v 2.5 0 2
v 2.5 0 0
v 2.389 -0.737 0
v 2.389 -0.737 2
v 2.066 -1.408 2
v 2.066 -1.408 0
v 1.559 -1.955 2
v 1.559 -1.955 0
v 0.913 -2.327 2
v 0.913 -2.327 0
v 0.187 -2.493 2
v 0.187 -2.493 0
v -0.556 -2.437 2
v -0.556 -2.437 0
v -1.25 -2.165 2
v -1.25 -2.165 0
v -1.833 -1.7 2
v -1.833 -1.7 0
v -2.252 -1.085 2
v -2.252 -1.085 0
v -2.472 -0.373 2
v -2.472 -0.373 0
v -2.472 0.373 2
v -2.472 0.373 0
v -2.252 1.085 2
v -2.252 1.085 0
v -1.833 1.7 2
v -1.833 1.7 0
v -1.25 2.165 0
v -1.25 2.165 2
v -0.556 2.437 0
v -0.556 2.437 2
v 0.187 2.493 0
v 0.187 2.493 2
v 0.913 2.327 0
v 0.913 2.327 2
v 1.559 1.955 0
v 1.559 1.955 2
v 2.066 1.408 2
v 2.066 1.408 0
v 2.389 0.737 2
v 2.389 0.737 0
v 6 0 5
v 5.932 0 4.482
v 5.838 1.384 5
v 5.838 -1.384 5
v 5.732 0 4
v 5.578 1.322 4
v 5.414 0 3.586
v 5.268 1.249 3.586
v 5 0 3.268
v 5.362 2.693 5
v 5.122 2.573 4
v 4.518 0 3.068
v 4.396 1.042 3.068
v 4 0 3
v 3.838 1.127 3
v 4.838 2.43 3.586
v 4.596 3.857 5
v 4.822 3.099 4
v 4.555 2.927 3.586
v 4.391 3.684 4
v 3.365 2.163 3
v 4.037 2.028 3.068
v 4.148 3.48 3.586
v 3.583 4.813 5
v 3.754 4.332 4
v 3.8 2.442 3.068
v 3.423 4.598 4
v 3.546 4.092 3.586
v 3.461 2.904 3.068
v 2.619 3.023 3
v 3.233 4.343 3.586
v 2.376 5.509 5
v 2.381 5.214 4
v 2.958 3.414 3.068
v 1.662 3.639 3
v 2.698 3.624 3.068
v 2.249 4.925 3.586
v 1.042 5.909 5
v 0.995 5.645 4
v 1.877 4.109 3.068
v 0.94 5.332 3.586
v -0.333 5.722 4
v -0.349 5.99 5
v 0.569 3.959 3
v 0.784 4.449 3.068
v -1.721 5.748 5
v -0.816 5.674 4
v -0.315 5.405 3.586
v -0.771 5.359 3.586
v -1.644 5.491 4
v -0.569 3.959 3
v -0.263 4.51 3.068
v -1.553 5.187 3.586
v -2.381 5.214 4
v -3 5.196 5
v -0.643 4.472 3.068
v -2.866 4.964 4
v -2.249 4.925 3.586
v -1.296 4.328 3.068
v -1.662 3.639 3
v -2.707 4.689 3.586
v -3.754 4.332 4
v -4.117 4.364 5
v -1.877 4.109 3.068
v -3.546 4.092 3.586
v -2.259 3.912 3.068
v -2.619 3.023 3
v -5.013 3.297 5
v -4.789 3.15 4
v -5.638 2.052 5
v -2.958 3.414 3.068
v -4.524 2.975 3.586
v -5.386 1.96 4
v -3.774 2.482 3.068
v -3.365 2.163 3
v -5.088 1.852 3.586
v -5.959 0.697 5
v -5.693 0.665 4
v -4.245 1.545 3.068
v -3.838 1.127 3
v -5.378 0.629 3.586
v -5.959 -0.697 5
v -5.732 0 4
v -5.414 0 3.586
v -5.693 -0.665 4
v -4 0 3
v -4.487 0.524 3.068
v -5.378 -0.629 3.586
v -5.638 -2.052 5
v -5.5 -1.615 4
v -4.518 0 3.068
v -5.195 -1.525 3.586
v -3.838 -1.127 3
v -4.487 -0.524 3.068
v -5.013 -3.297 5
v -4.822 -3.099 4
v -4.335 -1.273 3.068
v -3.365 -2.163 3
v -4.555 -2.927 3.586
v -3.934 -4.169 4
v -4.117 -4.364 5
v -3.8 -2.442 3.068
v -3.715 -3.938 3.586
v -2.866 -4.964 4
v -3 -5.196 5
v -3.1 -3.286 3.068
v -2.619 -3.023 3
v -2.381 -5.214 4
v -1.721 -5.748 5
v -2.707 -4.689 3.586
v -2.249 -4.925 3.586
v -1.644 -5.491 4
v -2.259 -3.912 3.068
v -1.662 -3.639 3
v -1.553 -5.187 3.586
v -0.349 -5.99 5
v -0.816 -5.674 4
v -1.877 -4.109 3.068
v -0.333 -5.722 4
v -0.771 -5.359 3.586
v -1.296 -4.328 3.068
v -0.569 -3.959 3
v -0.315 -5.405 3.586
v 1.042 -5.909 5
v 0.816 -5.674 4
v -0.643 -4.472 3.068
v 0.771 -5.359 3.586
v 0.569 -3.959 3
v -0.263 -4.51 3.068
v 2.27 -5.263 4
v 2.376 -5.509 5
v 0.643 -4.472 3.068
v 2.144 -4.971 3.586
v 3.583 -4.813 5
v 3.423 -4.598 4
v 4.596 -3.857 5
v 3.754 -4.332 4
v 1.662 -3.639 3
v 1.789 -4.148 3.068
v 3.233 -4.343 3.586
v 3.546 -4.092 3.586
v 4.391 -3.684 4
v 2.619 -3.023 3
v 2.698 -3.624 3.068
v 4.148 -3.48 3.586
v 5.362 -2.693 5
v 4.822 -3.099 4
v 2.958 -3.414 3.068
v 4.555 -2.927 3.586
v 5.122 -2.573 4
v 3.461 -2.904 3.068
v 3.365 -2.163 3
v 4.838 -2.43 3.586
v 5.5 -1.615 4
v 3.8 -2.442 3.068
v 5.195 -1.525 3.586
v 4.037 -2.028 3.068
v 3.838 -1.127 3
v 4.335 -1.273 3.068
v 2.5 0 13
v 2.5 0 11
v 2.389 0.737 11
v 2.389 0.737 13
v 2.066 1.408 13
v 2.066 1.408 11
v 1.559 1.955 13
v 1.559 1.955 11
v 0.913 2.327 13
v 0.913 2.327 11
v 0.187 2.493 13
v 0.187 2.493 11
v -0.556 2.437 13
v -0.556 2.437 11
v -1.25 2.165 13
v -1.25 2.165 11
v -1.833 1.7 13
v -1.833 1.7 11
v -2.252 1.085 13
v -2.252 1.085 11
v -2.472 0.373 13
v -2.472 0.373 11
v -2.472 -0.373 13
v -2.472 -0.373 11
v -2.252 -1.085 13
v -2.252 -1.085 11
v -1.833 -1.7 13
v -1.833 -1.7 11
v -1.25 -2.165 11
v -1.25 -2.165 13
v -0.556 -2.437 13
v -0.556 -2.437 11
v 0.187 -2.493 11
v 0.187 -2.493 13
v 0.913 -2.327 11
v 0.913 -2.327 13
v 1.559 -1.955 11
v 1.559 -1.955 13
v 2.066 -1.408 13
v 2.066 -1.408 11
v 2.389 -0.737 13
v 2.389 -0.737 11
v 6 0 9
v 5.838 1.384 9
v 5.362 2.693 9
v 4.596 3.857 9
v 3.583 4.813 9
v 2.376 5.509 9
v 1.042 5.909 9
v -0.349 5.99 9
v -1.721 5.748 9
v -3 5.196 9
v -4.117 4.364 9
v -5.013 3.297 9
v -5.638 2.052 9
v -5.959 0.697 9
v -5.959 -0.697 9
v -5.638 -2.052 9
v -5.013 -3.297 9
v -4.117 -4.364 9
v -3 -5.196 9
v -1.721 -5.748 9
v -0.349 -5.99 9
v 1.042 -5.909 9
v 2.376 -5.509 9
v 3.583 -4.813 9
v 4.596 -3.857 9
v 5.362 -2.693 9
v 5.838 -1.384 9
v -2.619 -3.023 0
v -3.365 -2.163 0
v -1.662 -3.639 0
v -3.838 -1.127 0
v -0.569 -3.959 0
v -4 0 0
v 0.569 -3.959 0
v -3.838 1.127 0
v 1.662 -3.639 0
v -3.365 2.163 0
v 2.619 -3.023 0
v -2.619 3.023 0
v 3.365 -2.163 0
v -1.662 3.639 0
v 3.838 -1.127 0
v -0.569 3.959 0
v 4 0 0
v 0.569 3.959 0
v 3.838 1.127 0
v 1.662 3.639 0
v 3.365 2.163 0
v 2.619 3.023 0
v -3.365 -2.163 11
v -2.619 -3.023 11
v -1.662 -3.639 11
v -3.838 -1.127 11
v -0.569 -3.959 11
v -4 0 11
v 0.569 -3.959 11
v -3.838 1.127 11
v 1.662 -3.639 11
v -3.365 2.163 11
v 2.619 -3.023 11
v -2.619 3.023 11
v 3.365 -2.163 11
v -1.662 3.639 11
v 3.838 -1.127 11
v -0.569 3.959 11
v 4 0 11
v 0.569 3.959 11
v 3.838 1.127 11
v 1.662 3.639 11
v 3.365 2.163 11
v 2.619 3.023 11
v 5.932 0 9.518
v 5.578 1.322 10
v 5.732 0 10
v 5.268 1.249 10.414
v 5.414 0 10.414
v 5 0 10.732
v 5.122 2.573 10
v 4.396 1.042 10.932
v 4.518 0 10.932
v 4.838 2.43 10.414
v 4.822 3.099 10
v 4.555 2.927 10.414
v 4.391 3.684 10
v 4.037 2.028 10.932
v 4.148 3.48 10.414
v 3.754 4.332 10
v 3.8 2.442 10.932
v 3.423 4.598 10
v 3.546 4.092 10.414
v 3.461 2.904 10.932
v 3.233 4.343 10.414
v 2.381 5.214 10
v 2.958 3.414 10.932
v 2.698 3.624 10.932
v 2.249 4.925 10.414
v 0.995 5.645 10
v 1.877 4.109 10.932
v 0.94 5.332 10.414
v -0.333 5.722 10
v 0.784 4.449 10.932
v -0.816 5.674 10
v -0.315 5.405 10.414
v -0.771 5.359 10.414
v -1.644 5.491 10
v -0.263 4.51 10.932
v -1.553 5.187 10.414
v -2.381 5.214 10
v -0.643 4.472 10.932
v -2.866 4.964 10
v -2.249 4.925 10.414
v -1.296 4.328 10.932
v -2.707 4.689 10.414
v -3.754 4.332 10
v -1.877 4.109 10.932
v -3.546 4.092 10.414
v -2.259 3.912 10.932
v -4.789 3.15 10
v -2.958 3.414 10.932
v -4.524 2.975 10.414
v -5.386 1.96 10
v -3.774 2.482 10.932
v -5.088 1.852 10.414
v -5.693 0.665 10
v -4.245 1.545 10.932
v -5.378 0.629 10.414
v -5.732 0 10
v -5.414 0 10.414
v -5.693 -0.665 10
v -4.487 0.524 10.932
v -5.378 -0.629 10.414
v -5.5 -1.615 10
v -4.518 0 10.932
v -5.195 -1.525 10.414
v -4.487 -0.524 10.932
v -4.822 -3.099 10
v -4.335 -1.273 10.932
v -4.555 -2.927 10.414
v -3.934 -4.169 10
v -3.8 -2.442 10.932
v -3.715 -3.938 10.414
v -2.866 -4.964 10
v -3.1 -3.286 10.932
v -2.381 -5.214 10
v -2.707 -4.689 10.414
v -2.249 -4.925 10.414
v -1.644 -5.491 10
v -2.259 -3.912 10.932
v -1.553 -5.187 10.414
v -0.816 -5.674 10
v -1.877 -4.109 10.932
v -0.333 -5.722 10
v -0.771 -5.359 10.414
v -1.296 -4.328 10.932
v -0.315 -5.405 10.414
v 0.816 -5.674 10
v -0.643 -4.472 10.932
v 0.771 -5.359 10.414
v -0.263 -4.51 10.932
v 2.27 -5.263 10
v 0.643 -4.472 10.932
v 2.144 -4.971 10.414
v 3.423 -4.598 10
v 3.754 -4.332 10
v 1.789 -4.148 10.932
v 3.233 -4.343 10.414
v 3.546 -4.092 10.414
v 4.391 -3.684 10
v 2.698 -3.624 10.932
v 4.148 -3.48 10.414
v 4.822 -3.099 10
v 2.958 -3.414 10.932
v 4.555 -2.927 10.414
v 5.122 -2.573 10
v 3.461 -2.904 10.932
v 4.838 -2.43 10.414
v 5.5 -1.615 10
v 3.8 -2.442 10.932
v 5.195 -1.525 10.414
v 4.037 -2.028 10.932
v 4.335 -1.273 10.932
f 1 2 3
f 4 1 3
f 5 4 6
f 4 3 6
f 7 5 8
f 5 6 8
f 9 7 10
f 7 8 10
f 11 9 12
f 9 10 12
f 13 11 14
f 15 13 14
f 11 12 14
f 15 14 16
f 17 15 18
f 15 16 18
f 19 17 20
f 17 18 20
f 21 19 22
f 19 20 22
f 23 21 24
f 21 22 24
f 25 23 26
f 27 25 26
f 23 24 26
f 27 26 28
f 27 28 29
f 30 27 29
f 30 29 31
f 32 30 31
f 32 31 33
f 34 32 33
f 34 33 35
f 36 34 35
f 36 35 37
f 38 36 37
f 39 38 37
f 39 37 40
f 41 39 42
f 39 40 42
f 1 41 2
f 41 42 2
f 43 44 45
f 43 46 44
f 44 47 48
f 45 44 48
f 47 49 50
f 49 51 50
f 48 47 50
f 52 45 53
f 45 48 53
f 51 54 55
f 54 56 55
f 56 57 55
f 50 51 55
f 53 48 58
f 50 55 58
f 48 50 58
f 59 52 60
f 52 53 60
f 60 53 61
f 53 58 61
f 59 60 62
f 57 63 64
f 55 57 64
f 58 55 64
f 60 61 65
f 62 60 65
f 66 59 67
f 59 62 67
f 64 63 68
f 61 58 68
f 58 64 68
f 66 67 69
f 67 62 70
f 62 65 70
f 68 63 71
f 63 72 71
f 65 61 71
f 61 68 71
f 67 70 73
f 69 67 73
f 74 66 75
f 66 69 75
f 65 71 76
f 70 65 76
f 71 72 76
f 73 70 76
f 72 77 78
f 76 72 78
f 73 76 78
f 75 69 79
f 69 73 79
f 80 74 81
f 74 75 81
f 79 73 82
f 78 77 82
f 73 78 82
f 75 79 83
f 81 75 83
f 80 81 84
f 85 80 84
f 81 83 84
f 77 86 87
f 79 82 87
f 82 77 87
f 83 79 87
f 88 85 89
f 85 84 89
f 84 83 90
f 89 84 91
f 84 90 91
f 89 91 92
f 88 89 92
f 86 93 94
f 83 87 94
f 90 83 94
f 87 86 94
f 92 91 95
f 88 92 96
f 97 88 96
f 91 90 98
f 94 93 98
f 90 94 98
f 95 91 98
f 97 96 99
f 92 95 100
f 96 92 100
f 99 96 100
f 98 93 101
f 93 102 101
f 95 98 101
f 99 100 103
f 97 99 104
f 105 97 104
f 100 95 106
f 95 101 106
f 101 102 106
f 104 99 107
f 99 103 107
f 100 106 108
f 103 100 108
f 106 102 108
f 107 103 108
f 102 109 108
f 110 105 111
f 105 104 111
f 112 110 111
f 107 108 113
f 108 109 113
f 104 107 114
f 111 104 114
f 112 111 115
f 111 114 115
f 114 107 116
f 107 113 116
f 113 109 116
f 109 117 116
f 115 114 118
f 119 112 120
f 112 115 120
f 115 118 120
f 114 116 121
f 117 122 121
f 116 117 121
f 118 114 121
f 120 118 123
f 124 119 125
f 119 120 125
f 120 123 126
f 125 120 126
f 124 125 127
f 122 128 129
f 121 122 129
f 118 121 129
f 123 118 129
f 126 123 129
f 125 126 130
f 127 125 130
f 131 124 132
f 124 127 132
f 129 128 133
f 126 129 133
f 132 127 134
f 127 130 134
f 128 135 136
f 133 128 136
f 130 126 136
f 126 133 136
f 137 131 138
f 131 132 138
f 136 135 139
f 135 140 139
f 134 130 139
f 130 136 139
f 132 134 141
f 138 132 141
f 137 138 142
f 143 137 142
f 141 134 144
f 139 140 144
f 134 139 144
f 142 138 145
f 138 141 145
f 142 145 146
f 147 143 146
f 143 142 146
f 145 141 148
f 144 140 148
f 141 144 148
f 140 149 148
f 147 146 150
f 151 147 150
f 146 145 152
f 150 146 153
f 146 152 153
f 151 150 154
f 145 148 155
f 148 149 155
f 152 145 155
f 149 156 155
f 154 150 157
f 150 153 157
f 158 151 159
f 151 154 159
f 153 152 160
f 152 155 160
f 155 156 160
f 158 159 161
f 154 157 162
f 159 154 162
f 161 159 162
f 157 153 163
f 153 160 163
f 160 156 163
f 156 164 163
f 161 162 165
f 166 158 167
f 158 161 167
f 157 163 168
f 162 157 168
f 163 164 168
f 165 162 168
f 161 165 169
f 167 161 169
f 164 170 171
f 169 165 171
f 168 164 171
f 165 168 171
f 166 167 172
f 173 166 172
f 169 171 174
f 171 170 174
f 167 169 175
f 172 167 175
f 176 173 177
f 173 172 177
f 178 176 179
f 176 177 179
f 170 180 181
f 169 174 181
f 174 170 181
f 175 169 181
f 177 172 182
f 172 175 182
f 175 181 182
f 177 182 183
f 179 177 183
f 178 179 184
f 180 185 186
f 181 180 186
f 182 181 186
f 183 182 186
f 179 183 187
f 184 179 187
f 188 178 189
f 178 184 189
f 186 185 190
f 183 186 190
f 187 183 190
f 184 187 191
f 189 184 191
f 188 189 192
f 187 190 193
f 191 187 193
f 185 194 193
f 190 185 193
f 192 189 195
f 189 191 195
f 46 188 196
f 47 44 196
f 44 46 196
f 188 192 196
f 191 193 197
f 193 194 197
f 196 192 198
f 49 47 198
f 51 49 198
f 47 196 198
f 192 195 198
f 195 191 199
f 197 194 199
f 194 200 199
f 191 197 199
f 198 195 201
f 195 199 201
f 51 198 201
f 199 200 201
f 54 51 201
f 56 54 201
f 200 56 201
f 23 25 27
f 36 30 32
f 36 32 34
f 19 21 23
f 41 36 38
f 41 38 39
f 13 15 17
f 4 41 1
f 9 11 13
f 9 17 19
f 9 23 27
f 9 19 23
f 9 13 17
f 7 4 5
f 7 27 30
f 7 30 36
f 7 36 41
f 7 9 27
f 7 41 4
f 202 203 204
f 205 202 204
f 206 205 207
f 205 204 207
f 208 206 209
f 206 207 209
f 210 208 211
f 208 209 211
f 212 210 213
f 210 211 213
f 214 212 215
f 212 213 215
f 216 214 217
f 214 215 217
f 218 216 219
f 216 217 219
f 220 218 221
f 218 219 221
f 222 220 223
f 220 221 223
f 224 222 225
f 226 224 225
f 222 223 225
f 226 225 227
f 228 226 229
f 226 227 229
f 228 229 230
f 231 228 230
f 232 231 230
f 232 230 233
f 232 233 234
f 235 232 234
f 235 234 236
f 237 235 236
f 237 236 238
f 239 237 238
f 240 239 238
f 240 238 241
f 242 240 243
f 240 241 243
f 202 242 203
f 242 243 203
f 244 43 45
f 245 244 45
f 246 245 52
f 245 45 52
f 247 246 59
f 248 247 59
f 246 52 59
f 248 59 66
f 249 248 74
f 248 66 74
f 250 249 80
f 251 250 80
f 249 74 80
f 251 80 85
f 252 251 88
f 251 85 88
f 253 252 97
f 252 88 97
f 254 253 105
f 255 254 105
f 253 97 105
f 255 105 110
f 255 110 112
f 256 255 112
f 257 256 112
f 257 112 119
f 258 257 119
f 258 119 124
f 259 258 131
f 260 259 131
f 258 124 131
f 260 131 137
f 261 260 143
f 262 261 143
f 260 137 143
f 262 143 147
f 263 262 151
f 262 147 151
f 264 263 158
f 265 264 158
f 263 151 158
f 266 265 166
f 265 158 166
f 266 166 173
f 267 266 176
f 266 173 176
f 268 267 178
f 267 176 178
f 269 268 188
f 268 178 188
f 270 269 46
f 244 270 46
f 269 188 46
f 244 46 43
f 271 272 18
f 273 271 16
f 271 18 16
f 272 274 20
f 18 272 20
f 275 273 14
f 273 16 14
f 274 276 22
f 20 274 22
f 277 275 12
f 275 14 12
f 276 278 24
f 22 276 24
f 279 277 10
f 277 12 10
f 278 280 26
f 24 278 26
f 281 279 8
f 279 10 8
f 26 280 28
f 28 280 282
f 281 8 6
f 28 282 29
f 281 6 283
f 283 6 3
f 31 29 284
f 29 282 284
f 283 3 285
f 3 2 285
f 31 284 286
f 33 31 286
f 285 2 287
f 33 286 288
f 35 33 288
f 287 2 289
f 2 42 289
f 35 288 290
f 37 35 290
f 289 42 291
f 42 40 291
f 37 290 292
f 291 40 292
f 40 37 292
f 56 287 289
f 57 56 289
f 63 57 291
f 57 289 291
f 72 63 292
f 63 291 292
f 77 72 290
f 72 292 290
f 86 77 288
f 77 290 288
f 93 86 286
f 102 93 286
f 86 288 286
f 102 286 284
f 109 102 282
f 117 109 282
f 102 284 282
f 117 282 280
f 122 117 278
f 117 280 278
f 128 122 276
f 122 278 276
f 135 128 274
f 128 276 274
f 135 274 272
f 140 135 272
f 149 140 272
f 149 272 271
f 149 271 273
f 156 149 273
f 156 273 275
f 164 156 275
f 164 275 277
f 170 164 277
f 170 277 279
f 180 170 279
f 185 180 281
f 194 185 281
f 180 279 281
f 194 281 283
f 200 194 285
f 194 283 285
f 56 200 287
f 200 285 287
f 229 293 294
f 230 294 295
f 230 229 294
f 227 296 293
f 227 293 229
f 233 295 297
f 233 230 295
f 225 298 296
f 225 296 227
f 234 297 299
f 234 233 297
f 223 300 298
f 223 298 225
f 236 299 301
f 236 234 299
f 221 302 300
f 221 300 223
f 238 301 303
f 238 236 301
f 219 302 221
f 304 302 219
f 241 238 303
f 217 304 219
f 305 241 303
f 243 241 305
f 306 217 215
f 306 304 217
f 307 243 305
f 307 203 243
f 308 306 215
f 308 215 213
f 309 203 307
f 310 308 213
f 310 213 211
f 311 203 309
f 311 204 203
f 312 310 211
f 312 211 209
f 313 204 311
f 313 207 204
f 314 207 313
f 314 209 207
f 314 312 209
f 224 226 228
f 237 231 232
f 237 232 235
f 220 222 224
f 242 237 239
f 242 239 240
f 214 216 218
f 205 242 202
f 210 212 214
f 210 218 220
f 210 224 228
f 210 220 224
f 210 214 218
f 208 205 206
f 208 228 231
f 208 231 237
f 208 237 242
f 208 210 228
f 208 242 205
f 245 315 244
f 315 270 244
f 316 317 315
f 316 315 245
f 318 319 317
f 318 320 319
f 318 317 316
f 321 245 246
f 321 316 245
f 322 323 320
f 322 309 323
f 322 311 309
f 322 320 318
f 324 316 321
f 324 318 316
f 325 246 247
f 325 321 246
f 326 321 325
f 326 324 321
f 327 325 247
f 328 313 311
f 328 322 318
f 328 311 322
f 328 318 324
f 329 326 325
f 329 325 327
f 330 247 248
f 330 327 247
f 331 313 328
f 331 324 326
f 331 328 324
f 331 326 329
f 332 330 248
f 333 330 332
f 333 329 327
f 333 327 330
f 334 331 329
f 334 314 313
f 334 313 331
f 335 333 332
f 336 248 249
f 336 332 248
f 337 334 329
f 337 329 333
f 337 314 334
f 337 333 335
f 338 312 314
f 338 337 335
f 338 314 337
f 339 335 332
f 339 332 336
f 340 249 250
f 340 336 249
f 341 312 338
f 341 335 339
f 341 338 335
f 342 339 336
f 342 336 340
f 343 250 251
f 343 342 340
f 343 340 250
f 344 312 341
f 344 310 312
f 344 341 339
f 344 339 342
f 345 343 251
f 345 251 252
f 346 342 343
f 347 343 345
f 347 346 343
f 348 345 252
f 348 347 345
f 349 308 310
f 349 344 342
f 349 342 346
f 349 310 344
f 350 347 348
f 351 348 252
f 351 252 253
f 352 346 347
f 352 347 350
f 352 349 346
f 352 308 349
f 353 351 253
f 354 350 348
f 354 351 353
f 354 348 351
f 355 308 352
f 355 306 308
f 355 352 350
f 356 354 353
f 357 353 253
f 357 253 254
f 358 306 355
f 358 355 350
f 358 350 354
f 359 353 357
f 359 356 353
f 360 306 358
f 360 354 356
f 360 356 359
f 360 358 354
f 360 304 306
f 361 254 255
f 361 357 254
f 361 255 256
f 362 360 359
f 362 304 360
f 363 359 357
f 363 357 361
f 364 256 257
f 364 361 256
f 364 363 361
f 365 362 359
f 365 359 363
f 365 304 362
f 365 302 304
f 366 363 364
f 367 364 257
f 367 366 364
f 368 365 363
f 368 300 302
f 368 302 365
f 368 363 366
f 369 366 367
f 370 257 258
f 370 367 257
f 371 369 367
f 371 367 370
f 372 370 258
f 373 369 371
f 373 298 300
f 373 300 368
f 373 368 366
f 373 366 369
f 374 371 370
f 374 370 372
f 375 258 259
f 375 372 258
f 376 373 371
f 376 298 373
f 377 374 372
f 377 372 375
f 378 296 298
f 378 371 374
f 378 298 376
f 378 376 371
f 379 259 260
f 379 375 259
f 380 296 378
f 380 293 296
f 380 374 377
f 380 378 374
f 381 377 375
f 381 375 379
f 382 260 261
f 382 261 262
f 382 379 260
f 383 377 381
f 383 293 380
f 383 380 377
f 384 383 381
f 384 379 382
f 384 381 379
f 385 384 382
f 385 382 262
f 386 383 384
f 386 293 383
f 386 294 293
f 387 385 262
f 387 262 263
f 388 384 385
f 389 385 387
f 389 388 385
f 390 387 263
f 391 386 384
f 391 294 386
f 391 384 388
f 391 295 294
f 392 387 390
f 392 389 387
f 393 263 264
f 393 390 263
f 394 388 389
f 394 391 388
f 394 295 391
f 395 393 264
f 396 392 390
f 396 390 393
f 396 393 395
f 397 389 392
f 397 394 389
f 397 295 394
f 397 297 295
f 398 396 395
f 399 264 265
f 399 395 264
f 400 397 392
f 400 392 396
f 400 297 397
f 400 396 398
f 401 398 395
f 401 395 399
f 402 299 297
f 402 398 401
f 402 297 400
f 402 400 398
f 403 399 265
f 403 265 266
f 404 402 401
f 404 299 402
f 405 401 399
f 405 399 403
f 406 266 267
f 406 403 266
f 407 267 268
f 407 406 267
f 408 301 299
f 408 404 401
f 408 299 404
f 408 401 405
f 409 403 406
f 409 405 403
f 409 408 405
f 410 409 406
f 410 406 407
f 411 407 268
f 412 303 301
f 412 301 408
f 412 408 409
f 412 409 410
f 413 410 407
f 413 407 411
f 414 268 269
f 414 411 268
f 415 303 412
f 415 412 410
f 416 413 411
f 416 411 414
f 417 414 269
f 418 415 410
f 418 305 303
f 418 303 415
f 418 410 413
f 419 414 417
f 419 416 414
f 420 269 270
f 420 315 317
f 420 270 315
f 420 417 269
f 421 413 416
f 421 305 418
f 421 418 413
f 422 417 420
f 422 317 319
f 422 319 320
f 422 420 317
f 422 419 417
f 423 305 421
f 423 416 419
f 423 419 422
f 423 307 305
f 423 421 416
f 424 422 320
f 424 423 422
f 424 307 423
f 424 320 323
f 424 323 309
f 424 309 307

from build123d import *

# Parameters (mm, degrees)
F0_R     = 4
F1_DEPTH = 3
F2_R     = 6
F3_DEPTH = 8
F4_R     = 2.5
F5_DEPTH = 2
F6_R     = 1.99999
F7_R     = 2.5
F8_DEPTH = 2


# Not quite as in the source:
# - a fillet or chamfer is up to 0.001 mm smaller than in the source, because OpenCascade refuses the exact size


with BuildPart() as f1:
    # F0 (on Top) → F1 (new body)
    with BuildSketch(Plane.XY):
        Circle(F0_R)
    extrude(amount=F1_DEPTH)

    # F2 (on face) → F3 (join)
    with BuildSketch(Plane.XY.offset(3)):
        Circle(F2_R)
    extrude(amount=F3_DEPTH)

    # F4 (on face) → F5 (join)
    with BuildSketch(Plane.XY.offset(11)):
        Circle(F4_R)
    extrude(amount=F5_DEPTH)

    # F6 (radius 2 in the source; OpenCascade refuses exactly that, so slightly less here)
    f6_edges = [f1.edges().sort_by_distance(p)[0] for p in [
        (-6, 0, 11),
        (-6, 0, 3),
    ]]
    fillet(f6_edges, radius=F6_R)

    # F7 (on face) → F8 (cut)
    with BuildSketch(Plane(origin=(0, 0, 0), x_dir=(1, 0, 0), z_dir=(0, 0, -1))):
        Circle(F7_R)
    extrude(amount=-F8_DEPTH, mode=Mode.SUBTRACT)


solid = f1.part
